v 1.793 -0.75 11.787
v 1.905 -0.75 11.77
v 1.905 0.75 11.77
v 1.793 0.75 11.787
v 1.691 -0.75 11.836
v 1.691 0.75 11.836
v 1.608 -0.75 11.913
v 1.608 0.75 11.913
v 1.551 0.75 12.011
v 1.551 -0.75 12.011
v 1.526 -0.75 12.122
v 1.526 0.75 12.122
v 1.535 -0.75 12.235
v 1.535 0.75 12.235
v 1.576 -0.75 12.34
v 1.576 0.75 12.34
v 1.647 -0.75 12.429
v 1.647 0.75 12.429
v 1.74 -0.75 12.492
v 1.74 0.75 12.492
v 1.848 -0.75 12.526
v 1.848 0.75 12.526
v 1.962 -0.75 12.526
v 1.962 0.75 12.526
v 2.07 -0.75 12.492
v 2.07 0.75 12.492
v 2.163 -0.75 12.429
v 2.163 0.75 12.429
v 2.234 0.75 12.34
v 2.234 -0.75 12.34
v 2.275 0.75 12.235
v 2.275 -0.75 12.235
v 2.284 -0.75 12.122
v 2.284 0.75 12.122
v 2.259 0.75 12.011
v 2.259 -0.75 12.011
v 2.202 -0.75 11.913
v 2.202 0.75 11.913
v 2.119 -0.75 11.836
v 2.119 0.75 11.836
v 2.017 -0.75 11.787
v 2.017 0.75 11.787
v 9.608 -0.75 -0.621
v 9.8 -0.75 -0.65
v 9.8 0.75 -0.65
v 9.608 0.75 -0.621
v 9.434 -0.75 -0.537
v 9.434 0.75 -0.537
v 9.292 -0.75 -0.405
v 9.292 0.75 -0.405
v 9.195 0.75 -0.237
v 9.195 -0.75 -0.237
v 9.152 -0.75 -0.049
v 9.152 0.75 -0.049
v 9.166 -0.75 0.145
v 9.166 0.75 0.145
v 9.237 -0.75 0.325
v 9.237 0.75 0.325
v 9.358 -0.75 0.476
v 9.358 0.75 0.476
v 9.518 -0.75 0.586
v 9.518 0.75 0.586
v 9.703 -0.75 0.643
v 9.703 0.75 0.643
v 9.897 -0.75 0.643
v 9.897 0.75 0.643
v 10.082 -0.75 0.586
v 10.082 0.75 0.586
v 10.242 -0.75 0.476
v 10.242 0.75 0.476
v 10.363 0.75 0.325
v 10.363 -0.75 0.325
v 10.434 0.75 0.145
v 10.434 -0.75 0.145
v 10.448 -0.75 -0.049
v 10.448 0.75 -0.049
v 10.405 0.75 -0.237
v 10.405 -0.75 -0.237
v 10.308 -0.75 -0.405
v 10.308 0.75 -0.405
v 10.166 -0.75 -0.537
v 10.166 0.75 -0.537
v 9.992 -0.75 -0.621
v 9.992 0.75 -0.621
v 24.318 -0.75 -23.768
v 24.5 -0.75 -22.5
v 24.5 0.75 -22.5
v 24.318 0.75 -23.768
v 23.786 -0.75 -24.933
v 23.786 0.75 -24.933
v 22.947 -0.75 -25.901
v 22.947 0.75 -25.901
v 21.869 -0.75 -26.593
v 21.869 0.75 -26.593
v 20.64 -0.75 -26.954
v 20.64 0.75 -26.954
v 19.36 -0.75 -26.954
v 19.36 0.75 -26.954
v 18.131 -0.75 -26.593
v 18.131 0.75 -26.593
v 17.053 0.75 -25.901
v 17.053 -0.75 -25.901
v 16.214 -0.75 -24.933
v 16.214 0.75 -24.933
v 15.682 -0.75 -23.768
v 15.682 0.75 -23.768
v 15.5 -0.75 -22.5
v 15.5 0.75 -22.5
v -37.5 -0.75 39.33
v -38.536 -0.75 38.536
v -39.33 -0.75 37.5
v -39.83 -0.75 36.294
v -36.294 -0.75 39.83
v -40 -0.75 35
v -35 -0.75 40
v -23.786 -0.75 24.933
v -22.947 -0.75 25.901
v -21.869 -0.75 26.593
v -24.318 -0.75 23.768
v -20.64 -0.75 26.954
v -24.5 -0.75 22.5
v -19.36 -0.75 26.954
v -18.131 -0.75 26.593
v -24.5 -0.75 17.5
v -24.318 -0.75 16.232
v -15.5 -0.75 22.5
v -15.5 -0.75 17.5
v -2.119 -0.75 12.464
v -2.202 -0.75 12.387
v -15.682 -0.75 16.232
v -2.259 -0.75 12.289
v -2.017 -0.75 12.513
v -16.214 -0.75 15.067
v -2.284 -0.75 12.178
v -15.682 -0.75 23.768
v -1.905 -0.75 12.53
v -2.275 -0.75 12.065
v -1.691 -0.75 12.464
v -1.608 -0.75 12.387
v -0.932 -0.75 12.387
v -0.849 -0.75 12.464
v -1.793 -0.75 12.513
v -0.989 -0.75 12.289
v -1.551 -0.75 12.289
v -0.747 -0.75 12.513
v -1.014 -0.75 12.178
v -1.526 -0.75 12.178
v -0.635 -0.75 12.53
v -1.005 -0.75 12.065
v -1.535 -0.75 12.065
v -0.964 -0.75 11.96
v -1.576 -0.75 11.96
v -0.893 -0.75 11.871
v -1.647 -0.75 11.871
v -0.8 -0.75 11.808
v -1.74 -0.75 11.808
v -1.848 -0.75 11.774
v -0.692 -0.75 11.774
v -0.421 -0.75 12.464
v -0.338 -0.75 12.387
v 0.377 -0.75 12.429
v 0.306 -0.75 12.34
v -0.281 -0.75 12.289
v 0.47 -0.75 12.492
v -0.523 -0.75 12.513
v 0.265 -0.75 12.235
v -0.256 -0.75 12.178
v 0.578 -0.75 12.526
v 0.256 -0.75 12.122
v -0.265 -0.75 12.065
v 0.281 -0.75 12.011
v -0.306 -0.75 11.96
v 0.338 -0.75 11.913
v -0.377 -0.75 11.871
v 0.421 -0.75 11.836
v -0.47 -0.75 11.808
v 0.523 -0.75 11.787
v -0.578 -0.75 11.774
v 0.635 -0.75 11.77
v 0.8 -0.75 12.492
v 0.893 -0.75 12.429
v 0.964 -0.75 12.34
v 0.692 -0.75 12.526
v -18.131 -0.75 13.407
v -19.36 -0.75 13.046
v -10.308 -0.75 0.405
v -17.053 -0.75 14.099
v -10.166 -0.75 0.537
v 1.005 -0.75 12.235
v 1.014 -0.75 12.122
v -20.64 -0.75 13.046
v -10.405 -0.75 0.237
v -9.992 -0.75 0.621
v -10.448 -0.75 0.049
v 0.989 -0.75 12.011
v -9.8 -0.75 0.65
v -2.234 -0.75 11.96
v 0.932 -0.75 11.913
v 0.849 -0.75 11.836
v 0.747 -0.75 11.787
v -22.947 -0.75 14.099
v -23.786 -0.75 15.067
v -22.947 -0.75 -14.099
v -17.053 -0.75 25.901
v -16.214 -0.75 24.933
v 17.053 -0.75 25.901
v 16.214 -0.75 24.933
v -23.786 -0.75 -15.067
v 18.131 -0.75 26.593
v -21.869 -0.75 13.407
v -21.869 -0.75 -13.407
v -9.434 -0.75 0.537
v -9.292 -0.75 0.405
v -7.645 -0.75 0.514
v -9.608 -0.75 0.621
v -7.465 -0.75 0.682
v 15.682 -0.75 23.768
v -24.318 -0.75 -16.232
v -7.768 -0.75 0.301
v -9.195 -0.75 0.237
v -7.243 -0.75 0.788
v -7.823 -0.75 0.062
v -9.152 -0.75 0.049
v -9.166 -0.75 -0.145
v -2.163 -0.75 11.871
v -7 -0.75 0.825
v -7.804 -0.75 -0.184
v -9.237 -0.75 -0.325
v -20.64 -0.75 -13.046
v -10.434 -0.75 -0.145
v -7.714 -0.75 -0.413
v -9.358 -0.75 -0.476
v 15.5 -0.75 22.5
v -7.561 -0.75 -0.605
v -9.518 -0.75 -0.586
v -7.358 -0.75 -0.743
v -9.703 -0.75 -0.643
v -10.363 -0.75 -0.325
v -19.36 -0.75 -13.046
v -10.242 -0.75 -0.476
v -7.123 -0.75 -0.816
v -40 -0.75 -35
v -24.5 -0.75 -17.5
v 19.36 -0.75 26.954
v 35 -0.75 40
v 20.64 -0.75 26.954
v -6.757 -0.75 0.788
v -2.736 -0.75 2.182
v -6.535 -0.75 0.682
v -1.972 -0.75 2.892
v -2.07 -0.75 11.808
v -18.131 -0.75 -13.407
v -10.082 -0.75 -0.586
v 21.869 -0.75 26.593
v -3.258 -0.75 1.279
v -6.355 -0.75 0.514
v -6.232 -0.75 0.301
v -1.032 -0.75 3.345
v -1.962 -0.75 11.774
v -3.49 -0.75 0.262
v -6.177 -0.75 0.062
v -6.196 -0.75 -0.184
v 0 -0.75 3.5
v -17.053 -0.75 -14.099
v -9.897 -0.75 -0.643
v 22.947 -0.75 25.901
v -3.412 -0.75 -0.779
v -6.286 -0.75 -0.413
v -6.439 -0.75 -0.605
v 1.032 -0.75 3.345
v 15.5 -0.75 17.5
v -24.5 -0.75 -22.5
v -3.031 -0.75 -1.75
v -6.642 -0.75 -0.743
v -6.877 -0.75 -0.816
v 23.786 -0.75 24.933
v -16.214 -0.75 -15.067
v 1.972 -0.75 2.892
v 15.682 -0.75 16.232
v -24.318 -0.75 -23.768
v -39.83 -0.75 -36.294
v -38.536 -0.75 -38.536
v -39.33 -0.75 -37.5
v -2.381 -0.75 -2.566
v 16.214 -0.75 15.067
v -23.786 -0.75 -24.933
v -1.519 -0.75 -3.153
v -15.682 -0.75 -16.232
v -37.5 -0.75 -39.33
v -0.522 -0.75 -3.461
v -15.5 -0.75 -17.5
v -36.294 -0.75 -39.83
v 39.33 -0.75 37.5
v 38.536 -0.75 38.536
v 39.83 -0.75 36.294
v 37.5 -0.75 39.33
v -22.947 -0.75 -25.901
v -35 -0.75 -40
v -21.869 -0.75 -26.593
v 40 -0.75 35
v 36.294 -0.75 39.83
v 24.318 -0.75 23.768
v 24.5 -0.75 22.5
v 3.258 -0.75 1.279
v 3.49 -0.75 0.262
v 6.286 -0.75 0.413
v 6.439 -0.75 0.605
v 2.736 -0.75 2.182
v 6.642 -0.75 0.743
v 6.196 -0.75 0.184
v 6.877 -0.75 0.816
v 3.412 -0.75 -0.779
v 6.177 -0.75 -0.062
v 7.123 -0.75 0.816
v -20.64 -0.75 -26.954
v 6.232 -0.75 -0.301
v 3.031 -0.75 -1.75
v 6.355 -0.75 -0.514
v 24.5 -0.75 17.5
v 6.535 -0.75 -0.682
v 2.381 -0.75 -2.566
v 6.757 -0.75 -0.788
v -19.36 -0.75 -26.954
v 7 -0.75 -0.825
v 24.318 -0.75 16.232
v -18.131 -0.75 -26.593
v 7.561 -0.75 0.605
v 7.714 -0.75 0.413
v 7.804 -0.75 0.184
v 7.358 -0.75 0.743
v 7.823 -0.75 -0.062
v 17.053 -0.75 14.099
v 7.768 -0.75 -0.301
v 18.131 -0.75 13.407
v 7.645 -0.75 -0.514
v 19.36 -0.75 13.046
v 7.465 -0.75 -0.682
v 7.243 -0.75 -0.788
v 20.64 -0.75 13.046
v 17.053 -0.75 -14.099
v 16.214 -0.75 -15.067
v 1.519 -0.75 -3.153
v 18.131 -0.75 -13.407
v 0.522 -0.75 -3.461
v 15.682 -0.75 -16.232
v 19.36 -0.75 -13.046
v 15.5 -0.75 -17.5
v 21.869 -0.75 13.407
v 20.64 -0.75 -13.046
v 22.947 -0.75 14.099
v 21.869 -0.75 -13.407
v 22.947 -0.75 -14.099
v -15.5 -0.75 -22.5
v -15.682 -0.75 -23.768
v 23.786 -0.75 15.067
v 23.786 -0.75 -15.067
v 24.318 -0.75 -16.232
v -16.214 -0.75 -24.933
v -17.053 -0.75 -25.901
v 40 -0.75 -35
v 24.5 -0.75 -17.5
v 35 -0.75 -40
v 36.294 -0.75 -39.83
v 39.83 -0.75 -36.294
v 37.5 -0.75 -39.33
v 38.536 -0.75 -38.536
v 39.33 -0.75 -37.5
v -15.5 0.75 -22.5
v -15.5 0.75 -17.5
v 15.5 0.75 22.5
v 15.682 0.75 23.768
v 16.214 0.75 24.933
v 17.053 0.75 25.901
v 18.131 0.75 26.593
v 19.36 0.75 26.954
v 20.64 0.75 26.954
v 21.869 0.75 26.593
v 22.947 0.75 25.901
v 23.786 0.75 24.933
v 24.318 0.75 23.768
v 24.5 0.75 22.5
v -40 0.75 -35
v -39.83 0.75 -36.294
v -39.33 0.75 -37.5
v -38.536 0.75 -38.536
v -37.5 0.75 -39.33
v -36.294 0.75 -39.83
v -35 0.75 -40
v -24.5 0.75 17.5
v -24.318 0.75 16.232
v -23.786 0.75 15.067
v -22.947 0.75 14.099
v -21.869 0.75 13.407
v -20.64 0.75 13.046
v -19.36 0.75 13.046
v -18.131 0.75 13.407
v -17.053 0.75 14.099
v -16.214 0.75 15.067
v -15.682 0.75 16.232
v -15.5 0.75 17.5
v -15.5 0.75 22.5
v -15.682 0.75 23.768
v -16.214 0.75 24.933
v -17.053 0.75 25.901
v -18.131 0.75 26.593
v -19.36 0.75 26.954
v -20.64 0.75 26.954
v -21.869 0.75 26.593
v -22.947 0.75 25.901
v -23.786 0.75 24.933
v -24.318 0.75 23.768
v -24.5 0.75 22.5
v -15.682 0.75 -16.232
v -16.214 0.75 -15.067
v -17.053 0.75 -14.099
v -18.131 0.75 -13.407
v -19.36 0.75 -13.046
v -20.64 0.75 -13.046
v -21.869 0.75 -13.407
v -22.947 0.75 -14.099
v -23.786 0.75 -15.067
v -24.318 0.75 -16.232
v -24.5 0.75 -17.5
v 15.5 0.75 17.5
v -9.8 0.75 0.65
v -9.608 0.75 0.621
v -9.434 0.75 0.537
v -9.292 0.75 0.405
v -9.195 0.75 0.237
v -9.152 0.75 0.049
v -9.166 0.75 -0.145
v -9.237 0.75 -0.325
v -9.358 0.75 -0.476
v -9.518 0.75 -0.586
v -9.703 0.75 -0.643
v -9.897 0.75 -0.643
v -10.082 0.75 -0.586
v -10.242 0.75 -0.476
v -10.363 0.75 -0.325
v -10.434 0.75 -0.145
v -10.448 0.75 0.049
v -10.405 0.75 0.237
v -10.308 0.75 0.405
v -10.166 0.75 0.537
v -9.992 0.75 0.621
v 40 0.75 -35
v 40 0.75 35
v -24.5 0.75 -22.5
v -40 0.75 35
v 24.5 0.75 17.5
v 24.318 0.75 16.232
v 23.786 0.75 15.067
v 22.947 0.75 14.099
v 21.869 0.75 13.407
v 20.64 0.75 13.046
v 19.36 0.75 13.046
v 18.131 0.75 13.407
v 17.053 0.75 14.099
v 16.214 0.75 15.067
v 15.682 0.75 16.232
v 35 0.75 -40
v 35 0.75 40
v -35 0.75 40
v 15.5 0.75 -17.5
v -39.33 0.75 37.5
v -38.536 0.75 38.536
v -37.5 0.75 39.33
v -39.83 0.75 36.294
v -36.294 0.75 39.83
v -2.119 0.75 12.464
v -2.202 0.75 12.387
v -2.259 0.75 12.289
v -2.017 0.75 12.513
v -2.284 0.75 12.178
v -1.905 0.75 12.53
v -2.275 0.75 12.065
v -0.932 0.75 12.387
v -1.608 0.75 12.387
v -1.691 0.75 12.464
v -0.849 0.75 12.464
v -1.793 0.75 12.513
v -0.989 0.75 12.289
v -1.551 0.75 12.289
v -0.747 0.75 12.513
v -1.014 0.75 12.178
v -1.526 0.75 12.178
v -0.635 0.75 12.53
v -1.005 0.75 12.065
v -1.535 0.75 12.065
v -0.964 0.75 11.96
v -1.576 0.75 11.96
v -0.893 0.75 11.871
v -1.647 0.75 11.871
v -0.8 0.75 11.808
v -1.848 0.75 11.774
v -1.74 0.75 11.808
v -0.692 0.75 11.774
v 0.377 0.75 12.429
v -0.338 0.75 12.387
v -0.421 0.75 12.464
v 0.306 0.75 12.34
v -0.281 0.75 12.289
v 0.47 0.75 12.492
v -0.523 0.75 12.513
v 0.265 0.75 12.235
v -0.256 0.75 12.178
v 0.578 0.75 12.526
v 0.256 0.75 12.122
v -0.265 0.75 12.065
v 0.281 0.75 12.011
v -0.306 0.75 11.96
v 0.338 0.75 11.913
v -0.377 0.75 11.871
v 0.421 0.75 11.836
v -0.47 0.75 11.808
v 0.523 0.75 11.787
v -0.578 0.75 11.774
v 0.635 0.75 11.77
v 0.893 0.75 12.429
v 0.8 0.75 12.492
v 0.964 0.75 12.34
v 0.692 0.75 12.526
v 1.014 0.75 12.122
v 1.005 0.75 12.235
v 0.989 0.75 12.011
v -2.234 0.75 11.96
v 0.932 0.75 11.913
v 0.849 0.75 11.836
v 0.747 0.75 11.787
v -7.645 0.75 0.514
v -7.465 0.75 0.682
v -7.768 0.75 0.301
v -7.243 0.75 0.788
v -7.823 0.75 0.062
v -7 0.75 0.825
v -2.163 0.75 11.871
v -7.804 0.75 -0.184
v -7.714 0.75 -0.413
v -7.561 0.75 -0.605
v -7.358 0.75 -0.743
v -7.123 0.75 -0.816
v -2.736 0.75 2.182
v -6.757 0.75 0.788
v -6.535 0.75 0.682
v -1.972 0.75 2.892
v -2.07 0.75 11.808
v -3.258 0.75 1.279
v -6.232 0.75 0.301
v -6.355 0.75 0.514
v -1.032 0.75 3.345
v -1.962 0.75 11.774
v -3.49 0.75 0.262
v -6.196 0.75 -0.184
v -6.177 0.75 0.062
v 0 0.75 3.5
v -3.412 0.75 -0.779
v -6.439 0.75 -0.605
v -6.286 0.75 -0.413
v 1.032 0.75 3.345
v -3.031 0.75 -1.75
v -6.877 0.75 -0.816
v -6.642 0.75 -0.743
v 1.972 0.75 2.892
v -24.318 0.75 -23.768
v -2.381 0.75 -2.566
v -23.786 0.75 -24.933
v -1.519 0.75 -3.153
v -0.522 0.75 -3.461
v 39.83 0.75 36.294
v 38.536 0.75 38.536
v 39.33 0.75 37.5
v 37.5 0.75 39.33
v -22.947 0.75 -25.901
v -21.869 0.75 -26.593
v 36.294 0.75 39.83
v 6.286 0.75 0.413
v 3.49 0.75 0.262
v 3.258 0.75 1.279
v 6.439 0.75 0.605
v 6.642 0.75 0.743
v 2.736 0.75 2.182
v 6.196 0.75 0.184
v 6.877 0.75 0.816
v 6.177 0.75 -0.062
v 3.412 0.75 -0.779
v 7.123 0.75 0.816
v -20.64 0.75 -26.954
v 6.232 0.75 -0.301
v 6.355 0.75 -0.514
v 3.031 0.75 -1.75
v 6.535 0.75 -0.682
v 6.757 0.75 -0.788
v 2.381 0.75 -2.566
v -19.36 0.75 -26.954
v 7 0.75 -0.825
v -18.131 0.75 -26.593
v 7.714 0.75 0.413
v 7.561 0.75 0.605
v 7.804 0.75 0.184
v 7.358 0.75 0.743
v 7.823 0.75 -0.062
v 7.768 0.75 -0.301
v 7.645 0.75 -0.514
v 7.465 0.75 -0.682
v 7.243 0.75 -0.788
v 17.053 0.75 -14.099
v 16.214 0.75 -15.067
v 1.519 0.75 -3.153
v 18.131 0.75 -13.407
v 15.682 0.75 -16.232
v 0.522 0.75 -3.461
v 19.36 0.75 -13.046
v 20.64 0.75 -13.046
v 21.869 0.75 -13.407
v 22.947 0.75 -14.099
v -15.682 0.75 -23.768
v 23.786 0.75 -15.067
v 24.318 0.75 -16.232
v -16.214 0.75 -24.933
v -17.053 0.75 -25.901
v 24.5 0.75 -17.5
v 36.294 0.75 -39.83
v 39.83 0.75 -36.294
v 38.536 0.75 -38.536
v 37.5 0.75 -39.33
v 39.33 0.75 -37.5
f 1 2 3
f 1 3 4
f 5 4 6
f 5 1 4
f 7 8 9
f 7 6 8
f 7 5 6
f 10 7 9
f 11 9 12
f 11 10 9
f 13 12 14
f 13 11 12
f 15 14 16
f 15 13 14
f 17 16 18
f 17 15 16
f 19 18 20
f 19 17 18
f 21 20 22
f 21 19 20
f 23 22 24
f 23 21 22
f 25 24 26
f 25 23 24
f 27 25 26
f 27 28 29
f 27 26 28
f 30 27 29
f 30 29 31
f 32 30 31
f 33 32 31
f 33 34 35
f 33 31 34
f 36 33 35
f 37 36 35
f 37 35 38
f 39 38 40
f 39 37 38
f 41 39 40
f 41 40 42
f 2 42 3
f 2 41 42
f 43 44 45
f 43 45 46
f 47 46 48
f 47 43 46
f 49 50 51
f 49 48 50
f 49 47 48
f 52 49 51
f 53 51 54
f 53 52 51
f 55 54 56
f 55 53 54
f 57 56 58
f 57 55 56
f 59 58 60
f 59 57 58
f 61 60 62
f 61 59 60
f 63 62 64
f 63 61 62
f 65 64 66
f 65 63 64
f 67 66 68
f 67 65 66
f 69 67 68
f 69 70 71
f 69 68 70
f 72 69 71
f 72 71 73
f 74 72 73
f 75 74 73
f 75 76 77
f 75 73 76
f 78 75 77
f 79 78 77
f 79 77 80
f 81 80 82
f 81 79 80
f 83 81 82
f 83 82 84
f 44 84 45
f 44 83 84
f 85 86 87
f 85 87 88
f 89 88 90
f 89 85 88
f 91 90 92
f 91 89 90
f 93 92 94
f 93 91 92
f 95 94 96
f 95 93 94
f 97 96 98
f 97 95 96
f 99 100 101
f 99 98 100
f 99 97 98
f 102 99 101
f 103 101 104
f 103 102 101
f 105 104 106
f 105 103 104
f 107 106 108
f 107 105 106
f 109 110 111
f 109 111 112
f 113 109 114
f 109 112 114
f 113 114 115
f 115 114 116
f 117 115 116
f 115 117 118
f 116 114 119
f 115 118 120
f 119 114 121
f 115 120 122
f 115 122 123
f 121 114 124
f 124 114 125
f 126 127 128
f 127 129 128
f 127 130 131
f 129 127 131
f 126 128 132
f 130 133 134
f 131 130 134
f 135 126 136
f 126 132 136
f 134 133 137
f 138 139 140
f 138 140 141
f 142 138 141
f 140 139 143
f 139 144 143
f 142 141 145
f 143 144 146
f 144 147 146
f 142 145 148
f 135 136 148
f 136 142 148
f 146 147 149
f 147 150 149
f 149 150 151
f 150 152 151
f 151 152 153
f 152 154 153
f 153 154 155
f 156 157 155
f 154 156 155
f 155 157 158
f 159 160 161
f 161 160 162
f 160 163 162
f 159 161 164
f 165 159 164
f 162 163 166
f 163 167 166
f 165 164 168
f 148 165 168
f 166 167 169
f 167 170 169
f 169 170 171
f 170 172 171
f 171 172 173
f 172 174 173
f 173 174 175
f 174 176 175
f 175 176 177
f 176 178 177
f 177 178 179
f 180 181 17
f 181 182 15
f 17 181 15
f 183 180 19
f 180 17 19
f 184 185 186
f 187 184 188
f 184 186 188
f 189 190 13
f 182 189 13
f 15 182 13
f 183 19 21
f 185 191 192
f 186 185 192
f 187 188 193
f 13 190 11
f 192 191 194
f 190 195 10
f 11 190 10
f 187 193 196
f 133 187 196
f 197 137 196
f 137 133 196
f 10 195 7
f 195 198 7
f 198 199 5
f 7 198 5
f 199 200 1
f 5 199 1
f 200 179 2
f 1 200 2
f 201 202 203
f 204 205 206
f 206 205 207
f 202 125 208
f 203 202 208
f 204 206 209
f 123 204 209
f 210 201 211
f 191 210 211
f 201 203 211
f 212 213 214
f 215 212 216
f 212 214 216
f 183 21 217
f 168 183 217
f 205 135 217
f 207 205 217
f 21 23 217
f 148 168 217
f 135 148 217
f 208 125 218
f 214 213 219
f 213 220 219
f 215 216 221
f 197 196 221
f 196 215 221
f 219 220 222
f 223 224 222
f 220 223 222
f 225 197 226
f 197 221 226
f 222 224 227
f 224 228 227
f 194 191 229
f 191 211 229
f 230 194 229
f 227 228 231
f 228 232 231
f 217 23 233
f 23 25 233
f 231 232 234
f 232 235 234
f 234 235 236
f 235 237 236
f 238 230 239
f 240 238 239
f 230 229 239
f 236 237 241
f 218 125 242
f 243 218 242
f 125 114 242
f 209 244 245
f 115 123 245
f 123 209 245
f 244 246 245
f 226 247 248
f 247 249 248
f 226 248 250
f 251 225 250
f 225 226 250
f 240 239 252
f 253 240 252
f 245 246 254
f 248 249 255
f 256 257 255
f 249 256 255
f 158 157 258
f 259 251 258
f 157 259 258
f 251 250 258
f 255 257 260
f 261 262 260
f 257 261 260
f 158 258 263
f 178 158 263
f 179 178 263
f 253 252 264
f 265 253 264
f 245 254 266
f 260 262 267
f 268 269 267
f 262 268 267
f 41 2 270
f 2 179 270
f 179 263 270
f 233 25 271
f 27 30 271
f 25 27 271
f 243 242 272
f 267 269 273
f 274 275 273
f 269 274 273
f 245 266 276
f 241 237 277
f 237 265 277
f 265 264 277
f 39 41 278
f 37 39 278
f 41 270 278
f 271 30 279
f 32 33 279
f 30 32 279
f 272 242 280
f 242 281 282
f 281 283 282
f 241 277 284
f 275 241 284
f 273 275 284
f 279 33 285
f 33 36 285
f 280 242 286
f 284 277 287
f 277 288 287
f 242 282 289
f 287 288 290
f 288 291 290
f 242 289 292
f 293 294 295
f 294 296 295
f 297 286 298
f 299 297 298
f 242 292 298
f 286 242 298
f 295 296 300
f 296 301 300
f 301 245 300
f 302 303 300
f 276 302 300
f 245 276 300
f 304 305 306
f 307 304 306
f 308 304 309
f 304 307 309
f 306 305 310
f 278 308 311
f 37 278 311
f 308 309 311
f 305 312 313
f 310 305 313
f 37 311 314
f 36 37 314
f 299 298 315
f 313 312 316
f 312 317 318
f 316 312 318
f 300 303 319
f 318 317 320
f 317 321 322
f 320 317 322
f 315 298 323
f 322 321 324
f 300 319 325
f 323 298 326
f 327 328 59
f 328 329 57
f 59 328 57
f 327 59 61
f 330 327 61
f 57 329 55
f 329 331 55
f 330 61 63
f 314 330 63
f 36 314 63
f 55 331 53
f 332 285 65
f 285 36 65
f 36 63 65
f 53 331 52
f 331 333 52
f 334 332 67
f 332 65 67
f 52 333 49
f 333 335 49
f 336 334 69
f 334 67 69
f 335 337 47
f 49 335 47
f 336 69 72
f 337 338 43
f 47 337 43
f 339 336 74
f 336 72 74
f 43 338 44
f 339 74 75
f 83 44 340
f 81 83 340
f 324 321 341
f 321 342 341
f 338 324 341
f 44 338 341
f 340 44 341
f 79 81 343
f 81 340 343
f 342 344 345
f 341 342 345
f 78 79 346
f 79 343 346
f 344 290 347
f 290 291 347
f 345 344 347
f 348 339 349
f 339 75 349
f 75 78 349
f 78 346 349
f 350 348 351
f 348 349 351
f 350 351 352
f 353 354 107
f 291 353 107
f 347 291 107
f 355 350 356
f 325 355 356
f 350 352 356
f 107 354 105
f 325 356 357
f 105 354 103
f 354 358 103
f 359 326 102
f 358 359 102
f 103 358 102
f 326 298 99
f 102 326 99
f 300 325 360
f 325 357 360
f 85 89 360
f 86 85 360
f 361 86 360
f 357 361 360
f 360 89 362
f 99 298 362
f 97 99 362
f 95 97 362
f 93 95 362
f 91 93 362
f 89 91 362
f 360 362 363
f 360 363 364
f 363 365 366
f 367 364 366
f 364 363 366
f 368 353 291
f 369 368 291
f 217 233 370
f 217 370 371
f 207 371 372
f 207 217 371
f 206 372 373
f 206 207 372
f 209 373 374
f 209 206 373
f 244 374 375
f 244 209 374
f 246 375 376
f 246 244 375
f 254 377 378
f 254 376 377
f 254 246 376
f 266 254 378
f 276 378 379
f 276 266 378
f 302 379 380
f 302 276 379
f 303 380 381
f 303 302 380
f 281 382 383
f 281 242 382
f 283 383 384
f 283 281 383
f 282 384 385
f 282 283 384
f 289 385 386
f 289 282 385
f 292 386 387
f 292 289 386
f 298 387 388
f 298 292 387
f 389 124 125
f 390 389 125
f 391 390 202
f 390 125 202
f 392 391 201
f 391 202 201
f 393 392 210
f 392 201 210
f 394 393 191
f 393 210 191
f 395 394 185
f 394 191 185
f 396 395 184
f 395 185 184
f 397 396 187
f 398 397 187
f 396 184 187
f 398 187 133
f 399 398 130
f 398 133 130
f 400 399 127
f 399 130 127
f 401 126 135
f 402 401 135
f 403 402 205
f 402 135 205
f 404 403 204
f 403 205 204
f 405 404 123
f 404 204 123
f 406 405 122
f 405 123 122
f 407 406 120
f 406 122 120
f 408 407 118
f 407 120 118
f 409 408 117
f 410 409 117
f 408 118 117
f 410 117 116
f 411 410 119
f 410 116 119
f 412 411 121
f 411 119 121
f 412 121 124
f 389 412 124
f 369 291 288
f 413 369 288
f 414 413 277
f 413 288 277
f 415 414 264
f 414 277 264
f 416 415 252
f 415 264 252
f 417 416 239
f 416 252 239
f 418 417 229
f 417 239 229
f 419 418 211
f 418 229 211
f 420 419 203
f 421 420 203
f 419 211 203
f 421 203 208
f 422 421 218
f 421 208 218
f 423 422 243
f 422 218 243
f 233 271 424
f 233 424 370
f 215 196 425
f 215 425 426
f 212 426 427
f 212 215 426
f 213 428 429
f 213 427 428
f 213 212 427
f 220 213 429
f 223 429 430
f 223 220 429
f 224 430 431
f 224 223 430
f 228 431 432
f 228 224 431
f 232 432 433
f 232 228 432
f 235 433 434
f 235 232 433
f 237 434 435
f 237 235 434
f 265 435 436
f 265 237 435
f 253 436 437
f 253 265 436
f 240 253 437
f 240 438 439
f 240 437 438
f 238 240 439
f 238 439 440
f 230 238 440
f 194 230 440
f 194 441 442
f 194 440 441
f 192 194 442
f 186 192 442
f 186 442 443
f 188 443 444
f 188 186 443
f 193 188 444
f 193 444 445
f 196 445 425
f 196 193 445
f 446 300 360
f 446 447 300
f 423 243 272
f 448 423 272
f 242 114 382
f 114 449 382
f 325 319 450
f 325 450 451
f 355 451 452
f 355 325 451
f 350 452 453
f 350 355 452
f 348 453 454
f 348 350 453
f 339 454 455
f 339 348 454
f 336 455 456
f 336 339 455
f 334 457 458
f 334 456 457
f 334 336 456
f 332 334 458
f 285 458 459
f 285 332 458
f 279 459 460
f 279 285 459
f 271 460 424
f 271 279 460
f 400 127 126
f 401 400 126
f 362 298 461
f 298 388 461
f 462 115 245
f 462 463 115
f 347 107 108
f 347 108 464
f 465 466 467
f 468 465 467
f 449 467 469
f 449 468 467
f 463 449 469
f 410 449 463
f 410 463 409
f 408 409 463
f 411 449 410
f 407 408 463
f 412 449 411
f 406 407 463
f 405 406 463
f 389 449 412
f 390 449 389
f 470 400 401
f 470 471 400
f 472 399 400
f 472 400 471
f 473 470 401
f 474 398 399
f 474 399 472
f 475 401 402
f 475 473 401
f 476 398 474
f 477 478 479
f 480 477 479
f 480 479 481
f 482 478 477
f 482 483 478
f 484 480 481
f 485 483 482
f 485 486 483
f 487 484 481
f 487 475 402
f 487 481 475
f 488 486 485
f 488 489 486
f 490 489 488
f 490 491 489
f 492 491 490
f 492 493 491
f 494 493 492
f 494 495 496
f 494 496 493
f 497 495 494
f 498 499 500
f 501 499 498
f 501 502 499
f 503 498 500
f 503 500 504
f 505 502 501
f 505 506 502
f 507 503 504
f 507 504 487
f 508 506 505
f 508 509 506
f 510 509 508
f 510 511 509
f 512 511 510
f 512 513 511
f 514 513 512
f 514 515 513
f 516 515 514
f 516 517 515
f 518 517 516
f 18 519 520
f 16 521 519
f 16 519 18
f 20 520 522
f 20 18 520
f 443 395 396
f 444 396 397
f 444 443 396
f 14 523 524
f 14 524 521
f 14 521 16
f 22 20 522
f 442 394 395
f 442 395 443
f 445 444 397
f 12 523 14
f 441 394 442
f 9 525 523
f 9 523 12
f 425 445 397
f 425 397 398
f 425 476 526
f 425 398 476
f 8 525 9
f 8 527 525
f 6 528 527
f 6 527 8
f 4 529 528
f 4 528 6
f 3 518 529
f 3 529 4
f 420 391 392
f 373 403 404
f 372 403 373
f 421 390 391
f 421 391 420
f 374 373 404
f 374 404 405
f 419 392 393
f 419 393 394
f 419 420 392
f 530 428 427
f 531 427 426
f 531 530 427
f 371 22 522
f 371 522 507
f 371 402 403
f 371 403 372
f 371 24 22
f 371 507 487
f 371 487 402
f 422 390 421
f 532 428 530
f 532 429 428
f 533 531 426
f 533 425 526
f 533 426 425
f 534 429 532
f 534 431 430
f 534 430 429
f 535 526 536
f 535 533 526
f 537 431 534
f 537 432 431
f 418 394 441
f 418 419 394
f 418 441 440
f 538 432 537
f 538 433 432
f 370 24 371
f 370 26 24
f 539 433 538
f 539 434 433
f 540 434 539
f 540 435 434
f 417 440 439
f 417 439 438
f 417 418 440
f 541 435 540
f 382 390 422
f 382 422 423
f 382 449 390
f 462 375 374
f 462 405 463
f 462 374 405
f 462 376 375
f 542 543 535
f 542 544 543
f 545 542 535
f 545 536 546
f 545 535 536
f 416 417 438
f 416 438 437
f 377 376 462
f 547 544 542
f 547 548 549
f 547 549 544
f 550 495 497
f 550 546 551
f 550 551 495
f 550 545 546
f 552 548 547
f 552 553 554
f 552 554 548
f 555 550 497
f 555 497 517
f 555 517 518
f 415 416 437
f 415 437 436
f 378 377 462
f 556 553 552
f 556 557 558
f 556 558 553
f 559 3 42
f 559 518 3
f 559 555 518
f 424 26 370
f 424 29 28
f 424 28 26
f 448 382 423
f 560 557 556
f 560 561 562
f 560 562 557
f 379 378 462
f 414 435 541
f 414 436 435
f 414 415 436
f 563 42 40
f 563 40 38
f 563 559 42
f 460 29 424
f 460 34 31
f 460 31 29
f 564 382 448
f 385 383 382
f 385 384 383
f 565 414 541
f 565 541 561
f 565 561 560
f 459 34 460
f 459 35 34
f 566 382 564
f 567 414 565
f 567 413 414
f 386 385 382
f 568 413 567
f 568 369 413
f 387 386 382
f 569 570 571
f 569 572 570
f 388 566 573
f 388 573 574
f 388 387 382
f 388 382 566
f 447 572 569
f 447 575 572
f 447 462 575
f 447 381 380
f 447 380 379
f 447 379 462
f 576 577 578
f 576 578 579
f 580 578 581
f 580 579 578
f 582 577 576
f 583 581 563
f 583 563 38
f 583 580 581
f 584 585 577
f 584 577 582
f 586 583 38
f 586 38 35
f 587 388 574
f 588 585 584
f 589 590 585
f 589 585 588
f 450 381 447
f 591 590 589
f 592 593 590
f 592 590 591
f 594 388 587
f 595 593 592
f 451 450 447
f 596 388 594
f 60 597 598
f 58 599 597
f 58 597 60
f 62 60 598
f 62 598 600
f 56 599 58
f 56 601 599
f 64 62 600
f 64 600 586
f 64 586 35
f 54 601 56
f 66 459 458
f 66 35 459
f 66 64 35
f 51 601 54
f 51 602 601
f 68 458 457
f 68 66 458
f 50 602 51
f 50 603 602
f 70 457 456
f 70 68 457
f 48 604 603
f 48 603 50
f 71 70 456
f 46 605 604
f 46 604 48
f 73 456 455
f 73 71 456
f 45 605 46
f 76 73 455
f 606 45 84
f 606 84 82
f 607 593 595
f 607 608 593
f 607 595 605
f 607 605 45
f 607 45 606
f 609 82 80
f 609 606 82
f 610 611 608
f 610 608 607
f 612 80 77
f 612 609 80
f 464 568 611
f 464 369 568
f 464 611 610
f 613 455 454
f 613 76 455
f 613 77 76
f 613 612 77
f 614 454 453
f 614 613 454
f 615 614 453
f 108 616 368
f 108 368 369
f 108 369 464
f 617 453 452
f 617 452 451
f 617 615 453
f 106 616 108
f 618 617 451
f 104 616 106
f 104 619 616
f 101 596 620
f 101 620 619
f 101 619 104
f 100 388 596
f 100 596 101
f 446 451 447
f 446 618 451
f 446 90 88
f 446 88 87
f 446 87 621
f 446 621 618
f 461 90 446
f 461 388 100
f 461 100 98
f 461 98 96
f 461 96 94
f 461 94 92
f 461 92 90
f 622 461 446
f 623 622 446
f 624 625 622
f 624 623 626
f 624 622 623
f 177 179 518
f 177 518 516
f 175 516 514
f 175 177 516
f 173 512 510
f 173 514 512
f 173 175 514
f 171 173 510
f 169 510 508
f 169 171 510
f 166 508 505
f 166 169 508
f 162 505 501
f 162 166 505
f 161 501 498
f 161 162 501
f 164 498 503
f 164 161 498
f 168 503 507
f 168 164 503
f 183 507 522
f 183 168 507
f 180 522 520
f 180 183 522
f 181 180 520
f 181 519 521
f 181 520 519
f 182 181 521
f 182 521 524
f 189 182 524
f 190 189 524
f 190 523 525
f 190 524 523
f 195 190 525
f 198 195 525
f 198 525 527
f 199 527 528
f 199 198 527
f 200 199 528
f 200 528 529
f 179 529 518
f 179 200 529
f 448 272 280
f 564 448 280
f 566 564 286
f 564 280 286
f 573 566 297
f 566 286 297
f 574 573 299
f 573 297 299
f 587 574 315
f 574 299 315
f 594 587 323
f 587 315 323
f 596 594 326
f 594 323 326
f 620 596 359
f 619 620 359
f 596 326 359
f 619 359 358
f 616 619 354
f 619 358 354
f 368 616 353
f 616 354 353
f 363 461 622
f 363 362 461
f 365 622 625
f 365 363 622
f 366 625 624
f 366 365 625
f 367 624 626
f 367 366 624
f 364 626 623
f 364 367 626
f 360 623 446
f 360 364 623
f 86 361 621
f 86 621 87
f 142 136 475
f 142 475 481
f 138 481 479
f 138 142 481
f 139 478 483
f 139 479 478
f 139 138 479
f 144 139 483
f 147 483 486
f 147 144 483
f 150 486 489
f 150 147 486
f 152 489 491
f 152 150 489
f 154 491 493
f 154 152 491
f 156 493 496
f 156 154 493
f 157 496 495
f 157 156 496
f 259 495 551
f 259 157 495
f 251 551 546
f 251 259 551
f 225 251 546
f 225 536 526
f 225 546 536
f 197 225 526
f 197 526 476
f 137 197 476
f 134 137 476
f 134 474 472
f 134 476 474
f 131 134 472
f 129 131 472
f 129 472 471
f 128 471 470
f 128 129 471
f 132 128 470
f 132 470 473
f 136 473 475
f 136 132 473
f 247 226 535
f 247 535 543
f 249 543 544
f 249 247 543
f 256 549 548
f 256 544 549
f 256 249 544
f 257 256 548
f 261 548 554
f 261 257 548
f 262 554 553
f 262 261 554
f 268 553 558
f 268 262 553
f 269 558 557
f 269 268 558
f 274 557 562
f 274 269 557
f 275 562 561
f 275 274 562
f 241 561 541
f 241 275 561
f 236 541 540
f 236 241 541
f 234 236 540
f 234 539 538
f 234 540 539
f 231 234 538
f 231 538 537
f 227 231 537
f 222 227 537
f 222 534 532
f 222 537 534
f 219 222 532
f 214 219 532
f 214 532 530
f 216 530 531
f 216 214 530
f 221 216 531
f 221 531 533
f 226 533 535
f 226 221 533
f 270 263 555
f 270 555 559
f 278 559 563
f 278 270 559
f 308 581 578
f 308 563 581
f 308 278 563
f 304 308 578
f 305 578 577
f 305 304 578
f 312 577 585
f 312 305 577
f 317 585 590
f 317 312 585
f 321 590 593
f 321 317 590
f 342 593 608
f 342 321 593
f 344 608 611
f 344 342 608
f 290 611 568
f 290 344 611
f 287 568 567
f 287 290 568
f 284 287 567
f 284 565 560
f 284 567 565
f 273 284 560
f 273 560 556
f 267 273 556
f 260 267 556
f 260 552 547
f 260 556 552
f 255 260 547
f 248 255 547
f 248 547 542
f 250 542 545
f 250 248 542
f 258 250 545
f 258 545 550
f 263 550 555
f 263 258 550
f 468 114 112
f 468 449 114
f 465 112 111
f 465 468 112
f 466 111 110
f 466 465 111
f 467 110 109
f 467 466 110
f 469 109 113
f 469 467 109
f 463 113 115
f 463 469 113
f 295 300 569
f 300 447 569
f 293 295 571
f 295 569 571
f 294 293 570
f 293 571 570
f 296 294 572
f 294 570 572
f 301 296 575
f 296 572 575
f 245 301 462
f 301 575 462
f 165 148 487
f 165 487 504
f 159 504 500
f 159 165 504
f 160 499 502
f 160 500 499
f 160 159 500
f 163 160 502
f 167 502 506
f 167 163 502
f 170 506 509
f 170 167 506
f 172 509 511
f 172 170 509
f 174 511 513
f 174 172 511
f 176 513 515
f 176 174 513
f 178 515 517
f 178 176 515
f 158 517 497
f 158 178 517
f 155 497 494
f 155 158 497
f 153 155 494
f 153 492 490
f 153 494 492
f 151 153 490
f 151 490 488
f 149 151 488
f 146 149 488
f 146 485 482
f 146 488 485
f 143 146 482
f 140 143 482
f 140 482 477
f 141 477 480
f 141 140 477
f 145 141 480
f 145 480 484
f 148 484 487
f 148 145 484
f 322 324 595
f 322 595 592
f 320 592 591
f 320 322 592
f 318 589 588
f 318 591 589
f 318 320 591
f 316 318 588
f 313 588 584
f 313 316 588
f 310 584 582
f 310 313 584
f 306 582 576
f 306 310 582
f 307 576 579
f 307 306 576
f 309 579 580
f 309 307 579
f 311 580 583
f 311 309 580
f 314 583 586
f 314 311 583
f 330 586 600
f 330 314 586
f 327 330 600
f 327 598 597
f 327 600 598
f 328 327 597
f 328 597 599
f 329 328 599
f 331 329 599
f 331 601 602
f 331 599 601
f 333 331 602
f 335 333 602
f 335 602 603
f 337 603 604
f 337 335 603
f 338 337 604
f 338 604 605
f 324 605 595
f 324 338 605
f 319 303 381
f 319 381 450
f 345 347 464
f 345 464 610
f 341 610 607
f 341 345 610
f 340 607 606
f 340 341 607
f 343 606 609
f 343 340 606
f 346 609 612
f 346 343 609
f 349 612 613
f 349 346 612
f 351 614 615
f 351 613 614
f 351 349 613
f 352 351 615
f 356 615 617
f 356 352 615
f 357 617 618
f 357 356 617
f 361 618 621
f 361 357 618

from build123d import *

# Parameters (mm, degrees)
SKETCH1_W               = 80
SKETCH1_H               = 80
BOSS_EXTRUDE1_DEPTH     = 0.75
FILLET1_R               = 5
FILLET3_R               = 5
FILLET4_R               = 5
FILLET5_R               = 5
CUT_EXTRUDE1_DEPTH      = 57.588426379
CUT_EXTRUDE1_DEPTH_BACK = 57.588426379
CUT_EXTRUDE2_DEPTH      = 57.588426379
CUT_EXTRUDE2_DEPTH_BACK = 57.588426379
SKETCH3_R               = 3.5
CUT_EXTRUDE3_DEPTH      = 57.588426379
CUT_EXTRUDE3_DEPTH_BACK = 57.588426379
SKETCH4_R               = 0.38
SKETCH4_R_2             = 0.65
SKETCH4_R_3             = 0.825


with BuildPart() as part:
    # Sketch1 → Boss-Extrude1 (new, symmetric)
    with BuildSketch(Plane(origin=(0, 0, 0), x_dir=(1, 0, 0), z_dir=(0, 1, 0))):
        Rectangle(SKETCH1_W, SKETCH1_H)
    extrude(amount=BOSS_EXTRUDE1_DEPTH, both=True)

    # Fillet1
    fillet1_edges = [part.edges().sort_by_distance(p)[0] for p in [
        (-40, 0, 40),
    ]]
    fillet(fillet1_edges, radius=FILLET1_R)

    # Fillet3
    fillet3_edges = [part.edges().sort_by_distance(p)[0] for p in [
        (-40, 0, -40),
    ]]
    fillet(fillet3_edges, radius=FILLET3_R)

    # Fillet4
    fillet4_edges = [part.edges().sort_by_distance(p)[0] for p in [
        (40, 0, -40),
    ]]
    fillet(fillet4_edges, radius=FILLET4_R)

    # Fillet5
    fillet5_edges = [part.edges().sort_by_distance(p)[0] for p in [
        (40, 0, 40),
    ]]
    fillet(fillet5_edges, radius=FILLET5_R)

    # Sketch2 → Cut-Extrude1 (cut, two sides: drawn at the far end of the back side and taken through both)
    with BuildSketch(Plane(origin=(0, 0.75, 0), x_dir=(1, 0, 0), z_dir=(0, 1, 0)).offset(-CUT_EXTRUDE1_DEPTH_BACK)):
        with BuildLine():
            Line((-24.5, 17.5), (-24.5, 22.5))
            ThreePointArc((-24.5, 22.5), (-20, 27), (-15.5, 22.5))
            Line((-15.5, 22.5), (-15.5, 17.5))
            ThreePointArc((-15.5, 17.5), (-20, 13), (-24.5, 17.5))
        make_face()
        with BuildLine():
            Line((-15.5, -17.5), (-15.5, -22.5))
            ThreePointArc((-15.5, -22.5), (-20, -27), (-24.5, -22.5))
            Line((-24.5, -22.5), (-24.5, -17.5))
            ThreePointArc((-24.5, -17.5), (-20, -13), (-15.5, -17.5))
        make_face()
        with BuildLine():
            Line((15.5, -17.5), (15.5, -22.5))
            ThreePointArc((15.5, -22.5), (20, -27), (24.5, -22.5))
            Line((24.5, -22.5), (24.5, -17.5))
            ThreePointArc((24.5, -17.5), (20, -13), (15.5, -17.5))
        make_face()
        with BuildLine():
            Line((24.5, 17.5), (24.5, 22.5))
            ThreePointArc((24.5, 22.5), (20, 27), (15.5, 22.5))
            Line((15.5, 22.5), (15.5, 17.5))
            ThreePointArc((15.5, 17.5), (20, 13), (24.5, 17.5))
        make_face()
    extrude(amount=CUT_EXTRUDE1_DEPTH + CUT_EXTRUDE1_DEPTH_BACK, mode=Mode.SUBTRACT)

    # Sketch3 → Cut-Extrude2 (cut, two sides: drawn at the far end of the back side and taken through both)
    with BuildSketch(Plane(origin=(0, 0.75, 0), x_dir=(1, 0, 0), z_dir=(0, 1, 0)).offset(-CUT_EXTRUDE2_DEPTH_BACK)):
        with Locations(Location((0, 0, 0), (0, 0, 270))):
            Circle(SKETCH3_R)
    extrude(amount=CUT_EXTRUDE2_DEPTH + CUT_EXTRUDE2_DEPTH_BACK, mode=Mode.SUBTRACT)

    # Sketch4 → Cut-Extrude3 (cut, two sides: drawn at the far end of the back side and taken through both)
    with BuildSketch(Plane(origin=(0, 0.75, 0), x_dir=(1, 0, 0), z_dir=(0, 1, 0)).offset(-CUT_EXTRUDE3_DEPTH_BACK)):
        with Locations(Location((-0.635, -12.15, 0), (0, 0, 270))):
            Circle(SKETCH4_R)
        with Locations(Location((-1.905, -12.15, 0), (0, 0, 270))):
            Circle(SKETCH4_R)
        with Locations(Location((-9.8, 0, 0), (0, 0, 270))):
            Circle(SKETCH4_R_2)
        with Locations(Location((-7, 0, 0), (0, 0, 270))):
            Circle(SKETCH4_R_3)
        with Locations(Location((7, 0, 0), (0, 0, 90))):
            Circle(SKETCH4_R_3)
        with Locations(Location((9.8, 0, 0), (0, 0, 90))):
            Circle(SKETCH4_R_2)
        with Locations(Location((0.635, -12.15, 0), (0, 0, 90))):
            Circle(SKETCH4_R)
        with Locations(Location((1.905, -12.15, 0), (0, 0, 90))):
            Circle(SKETCH4_R)
    extrude(amount=CUT_EXTRUDE3_DEPTH + CUT_EXTRUDE3_DEPTH_BACK, mode=Mode.SUBTRACT)


solid = part.part
